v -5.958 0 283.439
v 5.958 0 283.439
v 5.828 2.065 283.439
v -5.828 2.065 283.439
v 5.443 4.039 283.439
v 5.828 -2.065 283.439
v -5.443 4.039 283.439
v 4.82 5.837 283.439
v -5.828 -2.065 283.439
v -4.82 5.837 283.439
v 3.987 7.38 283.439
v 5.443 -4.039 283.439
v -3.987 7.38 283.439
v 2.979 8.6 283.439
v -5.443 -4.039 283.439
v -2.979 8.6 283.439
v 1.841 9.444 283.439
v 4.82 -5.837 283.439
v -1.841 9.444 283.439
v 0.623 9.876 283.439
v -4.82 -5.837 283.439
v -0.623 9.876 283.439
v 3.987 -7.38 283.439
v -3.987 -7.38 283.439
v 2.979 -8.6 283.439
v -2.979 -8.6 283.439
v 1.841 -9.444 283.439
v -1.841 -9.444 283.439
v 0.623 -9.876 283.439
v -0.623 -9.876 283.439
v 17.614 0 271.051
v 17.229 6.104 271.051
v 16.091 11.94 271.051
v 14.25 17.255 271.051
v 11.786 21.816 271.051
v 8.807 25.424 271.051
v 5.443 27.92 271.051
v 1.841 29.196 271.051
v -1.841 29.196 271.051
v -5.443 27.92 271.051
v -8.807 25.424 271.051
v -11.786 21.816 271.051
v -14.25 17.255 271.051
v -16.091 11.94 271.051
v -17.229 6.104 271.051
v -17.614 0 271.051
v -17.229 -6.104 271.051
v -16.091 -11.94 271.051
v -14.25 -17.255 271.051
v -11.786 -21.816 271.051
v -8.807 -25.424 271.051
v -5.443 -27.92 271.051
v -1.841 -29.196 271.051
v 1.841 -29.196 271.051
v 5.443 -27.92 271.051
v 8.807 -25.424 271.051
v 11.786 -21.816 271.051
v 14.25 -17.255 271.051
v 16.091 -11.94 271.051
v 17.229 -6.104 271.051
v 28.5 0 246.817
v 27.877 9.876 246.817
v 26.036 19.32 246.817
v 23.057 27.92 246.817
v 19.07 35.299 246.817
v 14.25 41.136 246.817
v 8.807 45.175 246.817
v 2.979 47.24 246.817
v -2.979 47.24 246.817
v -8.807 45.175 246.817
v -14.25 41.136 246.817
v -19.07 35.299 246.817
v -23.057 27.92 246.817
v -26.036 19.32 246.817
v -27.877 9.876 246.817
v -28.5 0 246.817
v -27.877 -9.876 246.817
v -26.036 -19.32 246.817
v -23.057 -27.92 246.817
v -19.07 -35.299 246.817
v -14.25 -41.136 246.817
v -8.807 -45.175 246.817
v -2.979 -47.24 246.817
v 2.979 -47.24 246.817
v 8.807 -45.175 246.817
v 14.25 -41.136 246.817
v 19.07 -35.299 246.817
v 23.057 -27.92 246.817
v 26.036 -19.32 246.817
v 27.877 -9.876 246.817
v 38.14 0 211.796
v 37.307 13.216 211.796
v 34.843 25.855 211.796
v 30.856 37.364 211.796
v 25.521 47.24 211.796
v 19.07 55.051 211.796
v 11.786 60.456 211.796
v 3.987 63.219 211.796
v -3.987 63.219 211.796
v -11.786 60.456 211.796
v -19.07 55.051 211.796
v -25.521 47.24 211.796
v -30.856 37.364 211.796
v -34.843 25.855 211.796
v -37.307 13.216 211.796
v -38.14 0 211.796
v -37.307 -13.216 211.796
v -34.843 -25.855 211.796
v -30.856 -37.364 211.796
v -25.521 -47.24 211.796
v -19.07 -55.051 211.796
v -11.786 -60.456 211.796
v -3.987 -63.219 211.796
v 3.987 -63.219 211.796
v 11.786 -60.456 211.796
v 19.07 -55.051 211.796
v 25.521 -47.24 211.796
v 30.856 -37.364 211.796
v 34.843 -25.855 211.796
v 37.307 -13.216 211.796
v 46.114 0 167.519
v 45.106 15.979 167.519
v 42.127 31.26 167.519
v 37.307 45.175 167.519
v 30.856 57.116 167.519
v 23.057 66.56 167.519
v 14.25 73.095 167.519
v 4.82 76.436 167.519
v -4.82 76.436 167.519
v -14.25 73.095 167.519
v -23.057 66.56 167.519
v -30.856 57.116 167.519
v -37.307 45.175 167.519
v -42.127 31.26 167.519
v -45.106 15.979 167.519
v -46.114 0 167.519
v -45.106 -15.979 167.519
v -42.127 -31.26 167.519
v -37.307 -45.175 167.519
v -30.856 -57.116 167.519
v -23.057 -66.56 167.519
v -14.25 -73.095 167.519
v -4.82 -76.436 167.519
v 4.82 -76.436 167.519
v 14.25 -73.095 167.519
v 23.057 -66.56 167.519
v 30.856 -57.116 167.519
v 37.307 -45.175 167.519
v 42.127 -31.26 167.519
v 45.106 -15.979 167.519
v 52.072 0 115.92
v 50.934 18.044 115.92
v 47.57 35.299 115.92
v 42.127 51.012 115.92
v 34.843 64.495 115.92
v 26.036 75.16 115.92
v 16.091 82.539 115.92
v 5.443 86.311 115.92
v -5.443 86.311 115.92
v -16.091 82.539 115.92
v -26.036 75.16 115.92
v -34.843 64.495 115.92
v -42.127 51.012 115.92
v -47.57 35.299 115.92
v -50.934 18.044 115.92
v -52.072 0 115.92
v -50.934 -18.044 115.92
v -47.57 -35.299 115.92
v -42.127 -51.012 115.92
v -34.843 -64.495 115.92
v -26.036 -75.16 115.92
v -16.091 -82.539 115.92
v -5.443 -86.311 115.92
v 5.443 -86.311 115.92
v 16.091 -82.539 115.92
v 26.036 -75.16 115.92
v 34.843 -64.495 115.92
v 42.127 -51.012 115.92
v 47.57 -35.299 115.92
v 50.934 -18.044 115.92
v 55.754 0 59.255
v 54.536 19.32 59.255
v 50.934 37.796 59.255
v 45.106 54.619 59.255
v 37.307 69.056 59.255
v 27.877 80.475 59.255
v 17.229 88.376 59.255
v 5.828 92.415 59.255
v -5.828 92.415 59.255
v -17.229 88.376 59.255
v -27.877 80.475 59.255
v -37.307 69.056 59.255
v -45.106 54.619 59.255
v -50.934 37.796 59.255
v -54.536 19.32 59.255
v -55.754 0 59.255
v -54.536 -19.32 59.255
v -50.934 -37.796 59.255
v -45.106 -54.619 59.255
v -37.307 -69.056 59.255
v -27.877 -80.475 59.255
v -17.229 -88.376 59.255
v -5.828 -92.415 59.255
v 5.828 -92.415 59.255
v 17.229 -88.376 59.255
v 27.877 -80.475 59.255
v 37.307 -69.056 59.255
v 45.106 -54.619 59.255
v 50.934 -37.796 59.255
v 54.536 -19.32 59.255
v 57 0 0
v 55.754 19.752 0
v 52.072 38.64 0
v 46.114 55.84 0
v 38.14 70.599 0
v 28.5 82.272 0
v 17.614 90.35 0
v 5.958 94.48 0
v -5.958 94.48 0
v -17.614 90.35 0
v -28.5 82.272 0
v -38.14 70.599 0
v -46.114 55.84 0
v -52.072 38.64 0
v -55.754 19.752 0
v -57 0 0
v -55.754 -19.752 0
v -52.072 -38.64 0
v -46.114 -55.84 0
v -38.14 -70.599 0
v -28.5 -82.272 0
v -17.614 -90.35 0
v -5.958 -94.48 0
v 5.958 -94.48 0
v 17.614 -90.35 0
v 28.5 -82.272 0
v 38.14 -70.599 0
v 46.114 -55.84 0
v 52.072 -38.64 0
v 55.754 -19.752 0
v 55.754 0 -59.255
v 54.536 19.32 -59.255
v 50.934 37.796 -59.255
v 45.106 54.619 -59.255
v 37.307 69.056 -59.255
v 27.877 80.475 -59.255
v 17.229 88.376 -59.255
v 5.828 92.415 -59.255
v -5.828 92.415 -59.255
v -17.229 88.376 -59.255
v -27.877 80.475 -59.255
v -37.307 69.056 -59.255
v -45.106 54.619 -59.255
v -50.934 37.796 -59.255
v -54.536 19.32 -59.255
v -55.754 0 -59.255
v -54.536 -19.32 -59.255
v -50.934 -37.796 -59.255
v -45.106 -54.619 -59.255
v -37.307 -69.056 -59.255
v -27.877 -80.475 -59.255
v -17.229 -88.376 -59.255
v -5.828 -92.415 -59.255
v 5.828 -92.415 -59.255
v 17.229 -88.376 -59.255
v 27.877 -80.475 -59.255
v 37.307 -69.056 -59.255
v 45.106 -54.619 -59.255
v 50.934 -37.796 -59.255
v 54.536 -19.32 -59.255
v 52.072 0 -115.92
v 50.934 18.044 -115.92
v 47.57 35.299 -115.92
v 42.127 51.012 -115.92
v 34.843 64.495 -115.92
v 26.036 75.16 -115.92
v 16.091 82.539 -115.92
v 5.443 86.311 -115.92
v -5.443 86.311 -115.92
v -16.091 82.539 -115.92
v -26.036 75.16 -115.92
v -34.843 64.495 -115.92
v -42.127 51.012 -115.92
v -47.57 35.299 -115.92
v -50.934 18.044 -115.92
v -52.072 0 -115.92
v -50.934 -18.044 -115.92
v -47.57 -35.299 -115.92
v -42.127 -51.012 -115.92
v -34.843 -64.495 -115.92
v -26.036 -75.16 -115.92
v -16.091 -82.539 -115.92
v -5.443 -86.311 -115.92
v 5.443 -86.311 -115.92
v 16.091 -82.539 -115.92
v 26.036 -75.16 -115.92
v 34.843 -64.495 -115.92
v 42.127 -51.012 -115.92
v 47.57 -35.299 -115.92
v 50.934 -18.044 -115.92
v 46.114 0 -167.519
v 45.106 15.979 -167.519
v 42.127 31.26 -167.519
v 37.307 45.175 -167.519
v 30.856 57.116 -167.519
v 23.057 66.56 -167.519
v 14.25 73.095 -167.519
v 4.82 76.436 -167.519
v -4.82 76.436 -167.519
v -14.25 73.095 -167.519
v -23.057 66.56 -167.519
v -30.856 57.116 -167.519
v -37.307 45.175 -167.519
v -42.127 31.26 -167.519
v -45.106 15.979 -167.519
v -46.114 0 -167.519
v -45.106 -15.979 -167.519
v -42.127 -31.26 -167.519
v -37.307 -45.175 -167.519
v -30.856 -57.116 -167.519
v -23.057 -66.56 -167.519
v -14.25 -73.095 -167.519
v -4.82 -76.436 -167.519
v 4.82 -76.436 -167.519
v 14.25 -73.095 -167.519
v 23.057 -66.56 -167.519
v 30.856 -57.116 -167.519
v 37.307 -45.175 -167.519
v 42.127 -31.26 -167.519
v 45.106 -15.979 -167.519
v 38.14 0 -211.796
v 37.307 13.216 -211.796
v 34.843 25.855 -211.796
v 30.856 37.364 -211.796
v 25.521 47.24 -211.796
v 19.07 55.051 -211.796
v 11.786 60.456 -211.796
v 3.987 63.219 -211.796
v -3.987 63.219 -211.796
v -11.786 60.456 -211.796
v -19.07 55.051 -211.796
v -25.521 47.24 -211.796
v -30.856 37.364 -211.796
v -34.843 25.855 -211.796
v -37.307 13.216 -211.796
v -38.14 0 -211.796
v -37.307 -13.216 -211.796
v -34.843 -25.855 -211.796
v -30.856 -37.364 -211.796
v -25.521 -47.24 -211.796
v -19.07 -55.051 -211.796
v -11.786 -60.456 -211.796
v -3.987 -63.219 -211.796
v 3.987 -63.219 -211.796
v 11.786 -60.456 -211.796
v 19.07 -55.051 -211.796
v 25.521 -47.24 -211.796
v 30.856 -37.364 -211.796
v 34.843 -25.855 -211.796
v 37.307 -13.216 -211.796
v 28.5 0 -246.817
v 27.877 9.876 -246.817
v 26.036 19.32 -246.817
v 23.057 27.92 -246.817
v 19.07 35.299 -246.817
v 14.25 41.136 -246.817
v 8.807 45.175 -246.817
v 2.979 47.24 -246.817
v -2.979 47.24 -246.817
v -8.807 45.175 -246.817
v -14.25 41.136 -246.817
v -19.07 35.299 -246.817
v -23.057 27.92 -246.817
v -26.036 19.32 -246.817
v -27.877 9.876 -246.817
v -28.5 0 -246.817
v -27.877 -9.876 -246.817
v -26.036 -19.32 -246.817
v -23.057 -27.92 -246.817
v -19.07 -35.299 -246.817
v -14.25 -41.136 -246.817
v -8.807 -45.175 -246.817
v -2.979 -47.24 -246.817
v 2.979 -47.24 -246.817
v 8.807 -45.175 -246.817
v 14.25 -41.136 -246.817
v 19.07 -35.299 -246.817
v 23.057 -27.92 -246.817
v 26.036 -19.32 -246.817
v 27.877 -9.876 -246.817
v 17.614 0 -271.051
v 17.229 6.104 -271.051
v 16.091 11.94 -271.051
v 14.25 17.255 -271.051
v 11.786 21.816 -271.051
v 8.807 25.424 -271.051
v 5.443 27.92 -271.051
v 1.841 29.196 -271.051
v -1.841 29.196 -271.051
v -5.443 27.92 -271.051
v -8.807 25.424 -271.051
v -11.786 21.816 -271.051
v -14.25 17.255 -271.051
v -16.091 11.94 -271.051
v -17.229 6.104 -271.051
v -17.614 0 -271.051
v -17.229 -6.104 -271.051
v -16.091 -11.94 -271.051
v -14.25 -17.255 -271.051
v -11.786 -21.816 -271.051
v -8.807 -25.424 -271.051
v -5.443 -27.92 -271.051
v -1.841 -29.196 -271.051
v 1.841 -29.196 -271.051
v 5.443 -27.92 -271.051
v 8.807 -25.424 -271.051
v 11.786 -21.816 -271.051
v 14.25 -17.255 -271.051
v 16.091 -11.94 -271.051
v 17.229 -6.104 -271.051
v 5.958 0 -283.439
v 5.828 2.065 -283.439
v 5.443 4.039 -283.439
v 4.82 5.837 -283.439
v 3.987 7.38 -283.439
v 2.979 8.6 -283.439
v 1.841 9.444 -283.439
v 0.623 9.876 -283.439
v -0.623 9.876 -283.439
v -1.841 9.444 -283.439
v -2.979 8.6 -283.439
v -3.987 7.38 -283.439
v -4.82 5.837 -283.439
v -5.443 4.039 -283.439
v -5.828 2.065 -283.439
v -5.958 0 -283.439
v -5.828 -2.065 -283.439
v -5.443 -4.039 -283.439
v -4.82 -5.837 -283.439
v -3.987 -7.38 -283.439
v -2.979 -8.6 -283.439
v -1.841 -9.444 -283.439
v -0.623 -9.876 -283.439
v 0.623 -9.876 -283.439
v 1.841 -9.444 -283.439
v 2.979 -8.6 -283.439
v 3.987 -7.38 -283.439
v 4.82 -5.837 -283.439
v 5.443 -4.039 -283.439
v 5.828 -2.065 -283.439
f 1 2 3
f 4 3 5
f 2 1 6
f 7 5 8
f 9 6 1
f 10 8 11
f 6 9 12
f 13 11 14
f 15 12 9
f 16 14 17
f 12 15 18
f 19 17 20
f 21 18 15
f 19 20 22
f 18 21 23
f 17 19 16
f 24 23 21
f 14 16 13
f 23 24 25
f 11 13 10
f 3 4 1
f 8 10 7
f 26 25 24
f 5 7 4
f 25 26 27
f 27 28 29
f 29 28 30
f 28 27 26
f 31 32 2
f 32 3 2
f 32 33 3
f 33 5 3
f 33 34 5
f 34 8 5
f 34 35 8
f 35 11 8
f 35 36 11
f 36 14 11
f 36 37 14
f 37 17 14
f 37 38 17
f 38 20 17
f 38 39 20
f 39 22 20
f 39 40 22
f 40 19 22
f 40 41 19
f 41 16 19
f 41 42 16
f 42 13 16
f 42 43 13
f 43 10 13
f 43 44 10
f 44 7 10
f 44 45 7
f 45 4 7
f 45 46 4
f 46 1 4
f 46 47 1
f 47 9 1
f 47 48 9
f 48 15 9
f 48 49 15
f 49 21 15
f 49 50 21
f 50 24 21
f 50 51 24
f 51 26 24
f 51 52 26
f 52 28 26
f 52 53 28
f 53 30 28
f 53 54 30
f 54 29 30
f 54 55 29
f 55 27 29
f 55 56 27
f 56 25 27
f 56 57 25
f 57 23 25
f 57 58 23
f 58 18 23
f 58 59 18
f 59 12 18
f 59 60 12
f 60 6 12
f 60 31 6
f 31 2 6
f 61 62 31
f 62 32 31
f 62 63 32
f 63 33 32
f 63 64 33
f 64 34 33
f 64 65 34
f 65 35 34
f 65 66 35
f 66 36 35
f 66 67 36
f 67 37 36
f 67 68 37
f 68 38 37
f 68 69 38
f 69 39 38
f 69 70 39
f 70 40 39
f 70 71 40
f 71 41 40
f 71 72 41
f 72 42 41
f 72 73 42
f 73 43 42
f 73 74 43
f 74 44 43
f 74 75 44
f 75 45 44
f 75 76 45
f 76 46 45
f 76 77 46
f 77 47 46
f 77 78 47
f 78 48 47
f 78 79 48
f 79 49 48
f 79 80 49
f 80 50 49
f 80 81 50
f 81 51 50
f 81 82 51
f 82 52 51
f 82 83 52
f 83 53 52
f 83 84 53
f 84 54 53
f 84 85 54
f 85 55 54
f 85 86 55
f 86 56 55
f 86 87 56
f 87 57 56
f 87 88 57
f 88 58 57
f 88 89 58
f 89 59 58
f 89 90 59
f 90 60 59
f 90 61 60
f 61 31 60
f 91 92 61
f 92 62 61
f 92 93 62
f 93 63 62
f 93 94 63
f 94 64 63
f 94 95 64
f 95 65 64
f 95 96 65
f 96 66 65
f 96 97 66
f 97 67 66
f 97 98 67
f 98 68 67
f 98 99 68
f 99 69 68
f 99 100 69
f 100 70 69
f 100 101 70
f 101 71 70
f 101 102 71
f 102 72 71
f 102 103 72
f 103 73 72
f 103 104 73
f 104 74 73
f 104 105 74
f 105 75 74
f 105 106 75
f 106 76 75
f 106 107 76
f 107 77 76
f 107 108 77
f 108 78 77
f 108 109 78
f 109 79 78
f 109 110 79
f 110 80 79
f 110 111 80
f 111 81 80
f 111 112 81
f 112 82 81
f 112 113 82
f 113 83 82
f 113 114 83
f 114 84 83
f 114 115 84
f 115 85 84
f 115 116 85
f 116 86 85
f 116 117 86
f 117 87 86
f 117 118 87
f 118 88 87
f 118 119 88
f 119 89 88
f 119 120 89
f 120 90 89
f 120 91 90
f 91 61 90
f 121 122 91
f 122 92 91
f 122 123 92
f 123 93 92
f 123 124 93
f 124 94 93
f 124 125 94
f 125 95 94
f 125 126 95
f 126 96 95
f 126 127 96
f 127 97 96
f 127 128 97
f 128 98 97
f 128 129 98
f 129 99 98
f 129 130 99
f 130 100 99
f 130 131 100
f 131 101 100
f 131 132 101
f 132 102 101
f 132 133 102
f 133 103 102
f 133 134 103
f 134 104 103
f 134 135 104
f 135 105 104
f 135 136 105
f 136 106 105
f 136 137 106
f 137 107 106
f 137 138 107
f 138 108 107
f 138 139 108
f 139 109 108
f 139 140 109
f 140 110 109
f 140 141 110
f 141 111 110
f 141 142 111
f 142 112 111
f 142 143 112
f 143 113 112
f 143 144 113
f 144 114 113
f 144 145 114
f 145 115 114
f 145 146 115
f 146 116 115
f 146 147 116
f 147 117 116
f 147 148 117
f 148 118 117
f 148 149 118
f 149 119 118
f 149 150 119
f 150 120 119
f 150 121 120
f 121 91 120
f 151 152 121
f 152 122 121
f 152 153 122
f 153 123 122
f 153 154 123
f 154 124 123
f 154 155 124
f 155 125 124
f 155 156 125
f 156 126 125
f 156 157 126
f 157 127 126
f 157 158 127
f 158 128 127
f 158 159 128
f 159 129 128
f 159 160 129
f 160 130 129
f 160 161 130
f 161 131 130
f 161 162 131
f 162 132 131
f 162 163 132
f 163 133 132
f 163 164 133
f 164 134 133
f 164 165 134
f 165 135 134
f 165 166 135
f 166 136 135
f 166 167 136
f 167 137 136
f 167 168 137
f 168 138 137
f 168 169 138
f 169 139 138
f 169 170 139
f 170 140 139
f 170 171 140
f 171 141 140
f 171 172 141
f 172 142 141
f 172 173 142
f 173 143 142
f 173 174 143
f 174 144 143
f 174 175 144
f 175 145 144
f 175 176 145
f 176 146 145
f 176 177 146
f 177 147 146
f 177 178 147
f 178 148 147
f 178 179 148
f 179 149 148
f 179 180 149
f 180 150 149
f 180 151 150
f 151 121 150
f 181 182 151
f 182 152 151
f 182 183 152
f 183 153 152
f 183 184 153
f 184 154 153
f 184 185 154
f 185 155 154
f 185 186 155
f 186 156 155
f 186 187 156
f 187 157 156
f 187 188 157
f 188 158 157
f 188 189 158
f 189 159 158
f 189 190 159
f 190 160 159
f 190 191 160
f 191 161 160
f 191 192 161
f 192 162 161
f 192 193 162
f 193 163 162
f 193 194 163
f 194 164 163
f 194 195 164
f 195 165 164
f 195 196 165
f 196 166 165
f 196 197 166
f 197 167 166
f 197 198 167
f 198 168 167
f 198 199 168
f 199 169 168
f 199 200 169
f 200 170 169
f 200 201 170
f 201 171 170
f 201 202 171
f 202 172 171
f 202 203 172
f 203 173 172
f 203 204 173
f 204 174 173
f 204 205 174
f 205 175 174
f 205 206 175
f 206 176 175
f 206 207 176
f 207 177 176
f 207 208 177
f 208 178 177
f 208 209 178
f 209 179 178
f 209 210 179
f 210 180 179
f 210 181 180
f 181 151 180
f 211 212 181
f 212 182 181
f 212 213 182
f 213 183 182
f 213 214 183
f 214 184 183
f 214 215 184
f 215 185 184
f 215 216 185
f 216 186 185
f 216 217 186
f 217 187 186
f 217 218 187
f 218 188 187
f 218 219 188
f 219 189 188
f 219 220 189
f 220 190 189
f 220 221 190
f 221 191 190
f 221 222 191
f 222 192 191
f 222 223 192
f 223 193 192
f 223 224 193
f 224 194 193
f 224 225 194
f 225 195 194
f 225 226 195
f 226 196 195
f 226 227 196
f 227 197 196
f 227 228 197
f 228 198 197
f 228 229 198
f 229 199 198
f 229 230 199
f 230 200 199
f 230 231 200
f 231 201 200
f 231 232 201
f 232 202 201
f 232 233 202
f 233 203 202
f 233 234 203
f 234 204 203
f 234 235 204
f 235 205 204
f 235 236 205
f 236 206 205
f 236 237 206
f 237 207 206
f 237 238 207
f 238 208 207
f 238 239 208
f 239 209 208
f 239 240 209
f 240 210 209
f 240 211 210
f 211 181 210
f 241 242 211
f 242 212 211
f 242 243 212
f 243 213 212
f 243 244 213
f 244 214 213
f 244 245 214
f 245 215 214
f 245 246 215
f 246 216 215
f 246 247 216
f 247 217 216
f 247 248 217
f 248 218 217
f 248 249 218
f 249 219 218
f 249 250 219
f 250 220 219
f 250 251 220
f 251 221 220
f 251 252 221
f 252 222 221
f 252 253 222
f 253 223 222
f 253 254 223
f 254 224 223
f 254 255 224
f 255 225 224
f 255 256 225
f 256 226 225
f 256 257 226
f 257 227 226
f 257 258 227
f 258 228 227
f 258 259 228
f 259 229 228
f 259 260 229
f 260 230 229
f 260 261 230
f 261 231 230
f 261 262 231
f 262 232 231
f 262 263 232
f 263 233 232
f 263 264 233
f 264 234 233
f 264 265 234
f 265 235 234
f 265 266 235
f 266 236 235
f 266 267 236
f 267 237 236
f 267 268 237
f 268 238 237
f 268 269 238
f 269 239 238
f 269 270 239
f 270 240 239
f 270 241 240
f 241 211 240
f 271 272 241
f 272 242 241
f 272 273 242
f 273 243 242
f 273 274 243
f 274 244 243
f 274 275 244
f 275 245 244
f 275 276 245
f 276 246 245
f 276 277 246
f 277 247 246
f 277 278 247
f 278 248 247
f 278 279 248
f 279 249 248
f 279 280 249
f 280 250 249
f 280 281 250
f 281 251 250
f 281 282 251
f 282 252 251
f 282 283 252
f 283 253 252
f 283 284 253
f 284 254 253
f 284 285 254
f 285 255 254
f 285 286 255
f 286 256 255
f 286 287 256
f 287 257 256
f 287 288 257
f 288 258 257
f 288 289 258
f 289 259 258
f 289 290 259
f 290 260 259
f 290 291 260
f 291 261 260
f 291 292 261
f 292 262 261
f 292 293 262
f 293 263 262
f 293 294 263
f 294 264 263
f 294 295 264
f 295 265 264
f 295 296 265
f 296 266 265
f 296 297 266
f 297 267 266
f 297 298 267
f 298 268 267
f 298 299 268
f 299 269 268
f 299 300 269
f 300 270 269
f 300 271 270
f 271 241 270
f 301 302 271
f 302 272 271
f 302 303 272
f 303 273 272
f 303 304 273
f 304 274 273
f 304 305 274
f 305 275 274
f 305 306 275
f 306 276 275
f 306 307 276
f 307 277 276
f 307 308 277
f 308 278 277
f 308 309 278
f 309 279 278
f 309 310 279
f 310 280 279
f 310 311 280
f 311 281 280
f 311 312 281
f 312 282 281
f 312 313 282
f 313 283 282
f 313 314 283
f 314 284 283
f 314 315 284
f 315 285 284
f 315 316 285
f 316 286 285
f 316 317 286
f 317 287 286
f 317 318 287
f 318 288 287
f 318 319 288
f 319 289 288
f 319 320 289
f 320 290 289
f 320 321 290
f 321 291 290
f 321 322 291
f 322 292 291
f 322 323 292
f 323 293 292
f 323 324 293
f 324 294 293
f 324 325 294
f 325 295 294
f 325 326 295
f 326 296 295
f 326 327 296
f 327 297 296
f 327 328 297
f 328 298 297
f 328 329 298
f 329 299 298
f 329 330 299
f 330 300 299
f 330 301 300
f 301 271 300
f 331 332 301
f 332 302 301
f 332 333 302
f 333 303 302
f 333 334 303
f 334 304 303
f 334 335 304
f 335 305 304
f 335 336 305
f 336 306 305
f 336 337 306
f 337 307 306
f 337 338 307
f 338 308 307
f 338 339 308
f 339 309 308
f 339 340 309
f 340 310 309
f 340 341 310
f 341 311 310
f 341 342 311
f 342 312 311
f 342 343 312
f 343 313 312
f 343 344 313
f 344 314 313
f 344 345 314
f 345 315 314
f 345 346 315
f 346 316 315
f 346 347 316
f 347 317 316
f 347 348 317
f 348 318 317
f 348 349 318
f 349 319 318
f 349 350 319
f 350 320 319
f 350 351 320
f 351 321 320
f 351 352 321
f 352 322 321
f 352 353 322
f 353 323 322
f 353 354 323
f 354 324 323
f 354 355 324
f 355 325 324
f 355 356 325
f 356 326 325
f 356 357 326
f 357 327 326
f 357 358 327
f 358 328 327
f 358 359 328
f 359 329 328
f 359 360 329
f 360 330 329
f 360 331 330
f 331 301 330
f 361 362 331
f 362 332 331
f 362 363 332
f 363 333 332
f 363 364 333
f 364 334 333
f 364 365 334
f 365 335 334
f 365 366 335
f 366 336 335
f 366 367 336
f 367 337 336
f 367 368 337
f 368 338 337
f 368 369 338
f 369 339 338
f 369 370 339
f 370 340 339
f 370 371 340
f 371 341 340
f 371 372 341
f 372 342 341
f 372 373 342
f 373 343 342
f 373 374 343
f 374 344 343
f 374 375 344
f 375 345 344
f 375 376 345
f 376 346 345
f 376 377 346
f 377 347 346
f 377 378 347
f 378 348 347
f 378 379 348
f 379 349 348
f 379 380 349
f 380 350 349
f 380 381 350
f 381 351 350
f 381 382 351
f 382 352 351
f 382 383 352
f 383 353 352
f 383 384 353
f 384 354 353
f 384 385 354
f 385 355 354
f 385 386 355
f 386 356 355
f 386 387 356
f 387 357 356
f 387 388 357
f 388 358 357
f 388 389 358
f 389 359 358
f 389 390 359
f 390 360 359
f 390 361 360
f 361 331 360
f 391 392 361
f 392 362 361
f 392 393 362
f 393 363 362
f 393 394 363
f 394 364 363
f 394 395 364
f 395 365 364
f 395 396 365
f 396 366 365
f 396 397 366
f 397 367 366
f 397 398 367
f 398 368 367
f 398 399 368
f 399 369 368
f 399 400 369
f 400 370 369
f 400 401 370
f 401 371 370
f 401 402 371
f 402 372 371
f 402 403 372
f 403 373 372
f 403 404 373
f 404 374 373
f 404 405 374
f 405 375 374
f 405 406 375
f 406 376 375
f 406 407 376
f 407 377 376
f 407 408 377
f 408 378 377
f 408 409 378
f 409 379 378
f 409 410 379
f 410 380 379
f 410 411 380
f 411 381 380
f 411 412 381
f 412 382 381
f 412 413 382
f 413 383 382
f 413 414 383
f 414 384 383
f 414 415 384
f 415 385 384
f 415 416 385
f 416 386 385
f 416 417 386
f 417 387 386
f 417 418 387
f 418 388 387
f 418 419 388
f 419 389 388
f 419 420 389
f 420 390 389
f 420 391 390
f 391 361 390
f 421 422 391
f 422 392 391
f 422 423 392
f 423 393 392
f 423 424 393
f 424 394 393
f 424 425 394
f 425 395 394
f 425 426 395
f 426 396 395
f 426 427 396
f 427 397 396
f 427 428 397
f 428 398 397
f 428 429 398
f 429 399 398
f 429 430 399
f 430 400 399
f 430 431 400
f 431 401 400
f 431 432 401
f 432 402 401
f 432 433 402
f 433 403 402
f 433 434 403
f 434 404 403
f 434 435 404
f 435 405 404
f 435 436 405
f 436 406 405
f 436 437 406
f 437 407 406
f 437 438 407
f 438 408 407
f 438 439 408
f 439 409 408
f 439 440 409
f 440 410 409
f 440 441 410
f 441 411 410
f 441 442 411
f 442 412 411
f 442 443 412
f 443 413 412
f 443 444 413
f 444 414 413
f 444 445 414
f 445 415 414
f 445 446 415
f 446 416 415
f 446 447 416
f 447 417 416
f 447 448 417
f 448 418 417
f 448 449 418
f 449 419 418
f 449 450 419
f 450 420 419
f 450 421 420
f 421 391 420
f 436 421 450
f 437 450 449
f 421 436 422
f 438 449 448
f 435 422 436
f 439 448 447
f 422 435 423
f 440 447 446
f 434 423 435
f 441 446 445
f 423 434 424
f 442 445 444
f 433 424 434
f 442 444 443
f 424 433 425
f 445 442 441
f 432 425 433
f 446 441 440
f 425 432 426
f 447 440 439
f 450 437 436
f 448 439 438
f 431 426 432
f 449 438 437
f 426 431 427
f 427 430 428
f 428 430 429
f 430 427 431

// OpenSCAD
// Generated by SolidPython 1.0.1 on 2020-07-29 00:39:25


scale(v = [3, 5, 15]) {
	sphere(r = 19);
}
/***********************************************
*********      SolidPython code:      **********
************************************************
 
# import packages: SolidPython
from solid import *
from solid.utils import *
from itertools import chain, combinations


class Resize:

    def __init__(self, scad_file):
        self.scad_file = scad_file
        #self.scad_file = import_scad(scad_file)
        # cone/cylinder param:
        self.r1 = 0
        self.r2 = 0
        self.h = 0
        # rectangular prism param:
        self.w = 0
        self.l = 0
        # ellipse param:
        self.r = 0

    # import OpenScad code (file name corresponds to shape)


    # classify shape + parameters
    def assign(self, param1, param2, param3):
        if self.scad_file == 'cone.scad':
            self.r1 = param1
            self.r2 = param2
            self.h = param3
        elif self.scad_file == 'cylinder.scad':
            self.r1 = param1
            self.r2 = param2
            self.h = param3
        elif self.scad_file == 'rectangularPrism.scad':
            self.h = param1
            self.l = param2
            self.w = param3
        else:
            self.r = param1
            self.h = param2

    # resize parameters
    def iterate(self):
        x = range(3, 20, 2)
        i = 1
        if self.scad_file == 'cone.scad':
            tempList = list(combinations(x, 2))
            for temp in tempList:
                param1 = temp[0]
                param2 = temp[1]
                filepath = 'produced_scad_files/' + 'cone' + str(param1) + '_' + str(param2) + '_' + '.scad'
                scad_render_to_file(cylinder(h=param1, r1=param2, r2=0), filepath)

        elif self.scad_file == 'cylinder.scad':
            tempList = list(combinations(x, 3))
            for temp in tempList:
                param1 = temp[0]
                param2 = temp[1]
                filepath = 'produced_scad_files/' + 'cylinder' + str(param1) + '_' + str(param2) + '_' + '.scad'
                scad_render_to_file(cylinder(h=param1, r1=param2, r2=param2), filepath)

        elif self.scad_file == 'rectangularPrism.scad':
            tempList = list(combinations(x, 3))
            for temp in tempList:
                param1 = temp[0]
                param2 = temp[1]
                param3 = temp[2]
                filepath = 'produced_scad_files/' + 'rectangularPrism' + str(param1) + '_' + str(param2) + '_' + str(
                    param3) + '.scad'
                scad_render_to_file(cube(size=(param1, param2, param3)), filepath)

        elif self.scad_file == 'ellipse.scad':
            tempList = list(combinations(x, 4))
            for temp in tempList:
                param1 = temp[0]
                param2 = temp[1]
                param3 = temp[2]
                param4 = temp[3]
                filepath = 'produced_scad_files/' + 'ellipse' + str(param1) + '_' + str(param2) + '_' + str(param3) + '_' + str(param4) + '.scad'
                scad_render_to_file(scale([param1, param2, param3])(sphere(r=param4)), filepath)

    def render_to_scadfile(self):
        scad_render_to_file(scad, 'example.scad') 
 
************************************************/
